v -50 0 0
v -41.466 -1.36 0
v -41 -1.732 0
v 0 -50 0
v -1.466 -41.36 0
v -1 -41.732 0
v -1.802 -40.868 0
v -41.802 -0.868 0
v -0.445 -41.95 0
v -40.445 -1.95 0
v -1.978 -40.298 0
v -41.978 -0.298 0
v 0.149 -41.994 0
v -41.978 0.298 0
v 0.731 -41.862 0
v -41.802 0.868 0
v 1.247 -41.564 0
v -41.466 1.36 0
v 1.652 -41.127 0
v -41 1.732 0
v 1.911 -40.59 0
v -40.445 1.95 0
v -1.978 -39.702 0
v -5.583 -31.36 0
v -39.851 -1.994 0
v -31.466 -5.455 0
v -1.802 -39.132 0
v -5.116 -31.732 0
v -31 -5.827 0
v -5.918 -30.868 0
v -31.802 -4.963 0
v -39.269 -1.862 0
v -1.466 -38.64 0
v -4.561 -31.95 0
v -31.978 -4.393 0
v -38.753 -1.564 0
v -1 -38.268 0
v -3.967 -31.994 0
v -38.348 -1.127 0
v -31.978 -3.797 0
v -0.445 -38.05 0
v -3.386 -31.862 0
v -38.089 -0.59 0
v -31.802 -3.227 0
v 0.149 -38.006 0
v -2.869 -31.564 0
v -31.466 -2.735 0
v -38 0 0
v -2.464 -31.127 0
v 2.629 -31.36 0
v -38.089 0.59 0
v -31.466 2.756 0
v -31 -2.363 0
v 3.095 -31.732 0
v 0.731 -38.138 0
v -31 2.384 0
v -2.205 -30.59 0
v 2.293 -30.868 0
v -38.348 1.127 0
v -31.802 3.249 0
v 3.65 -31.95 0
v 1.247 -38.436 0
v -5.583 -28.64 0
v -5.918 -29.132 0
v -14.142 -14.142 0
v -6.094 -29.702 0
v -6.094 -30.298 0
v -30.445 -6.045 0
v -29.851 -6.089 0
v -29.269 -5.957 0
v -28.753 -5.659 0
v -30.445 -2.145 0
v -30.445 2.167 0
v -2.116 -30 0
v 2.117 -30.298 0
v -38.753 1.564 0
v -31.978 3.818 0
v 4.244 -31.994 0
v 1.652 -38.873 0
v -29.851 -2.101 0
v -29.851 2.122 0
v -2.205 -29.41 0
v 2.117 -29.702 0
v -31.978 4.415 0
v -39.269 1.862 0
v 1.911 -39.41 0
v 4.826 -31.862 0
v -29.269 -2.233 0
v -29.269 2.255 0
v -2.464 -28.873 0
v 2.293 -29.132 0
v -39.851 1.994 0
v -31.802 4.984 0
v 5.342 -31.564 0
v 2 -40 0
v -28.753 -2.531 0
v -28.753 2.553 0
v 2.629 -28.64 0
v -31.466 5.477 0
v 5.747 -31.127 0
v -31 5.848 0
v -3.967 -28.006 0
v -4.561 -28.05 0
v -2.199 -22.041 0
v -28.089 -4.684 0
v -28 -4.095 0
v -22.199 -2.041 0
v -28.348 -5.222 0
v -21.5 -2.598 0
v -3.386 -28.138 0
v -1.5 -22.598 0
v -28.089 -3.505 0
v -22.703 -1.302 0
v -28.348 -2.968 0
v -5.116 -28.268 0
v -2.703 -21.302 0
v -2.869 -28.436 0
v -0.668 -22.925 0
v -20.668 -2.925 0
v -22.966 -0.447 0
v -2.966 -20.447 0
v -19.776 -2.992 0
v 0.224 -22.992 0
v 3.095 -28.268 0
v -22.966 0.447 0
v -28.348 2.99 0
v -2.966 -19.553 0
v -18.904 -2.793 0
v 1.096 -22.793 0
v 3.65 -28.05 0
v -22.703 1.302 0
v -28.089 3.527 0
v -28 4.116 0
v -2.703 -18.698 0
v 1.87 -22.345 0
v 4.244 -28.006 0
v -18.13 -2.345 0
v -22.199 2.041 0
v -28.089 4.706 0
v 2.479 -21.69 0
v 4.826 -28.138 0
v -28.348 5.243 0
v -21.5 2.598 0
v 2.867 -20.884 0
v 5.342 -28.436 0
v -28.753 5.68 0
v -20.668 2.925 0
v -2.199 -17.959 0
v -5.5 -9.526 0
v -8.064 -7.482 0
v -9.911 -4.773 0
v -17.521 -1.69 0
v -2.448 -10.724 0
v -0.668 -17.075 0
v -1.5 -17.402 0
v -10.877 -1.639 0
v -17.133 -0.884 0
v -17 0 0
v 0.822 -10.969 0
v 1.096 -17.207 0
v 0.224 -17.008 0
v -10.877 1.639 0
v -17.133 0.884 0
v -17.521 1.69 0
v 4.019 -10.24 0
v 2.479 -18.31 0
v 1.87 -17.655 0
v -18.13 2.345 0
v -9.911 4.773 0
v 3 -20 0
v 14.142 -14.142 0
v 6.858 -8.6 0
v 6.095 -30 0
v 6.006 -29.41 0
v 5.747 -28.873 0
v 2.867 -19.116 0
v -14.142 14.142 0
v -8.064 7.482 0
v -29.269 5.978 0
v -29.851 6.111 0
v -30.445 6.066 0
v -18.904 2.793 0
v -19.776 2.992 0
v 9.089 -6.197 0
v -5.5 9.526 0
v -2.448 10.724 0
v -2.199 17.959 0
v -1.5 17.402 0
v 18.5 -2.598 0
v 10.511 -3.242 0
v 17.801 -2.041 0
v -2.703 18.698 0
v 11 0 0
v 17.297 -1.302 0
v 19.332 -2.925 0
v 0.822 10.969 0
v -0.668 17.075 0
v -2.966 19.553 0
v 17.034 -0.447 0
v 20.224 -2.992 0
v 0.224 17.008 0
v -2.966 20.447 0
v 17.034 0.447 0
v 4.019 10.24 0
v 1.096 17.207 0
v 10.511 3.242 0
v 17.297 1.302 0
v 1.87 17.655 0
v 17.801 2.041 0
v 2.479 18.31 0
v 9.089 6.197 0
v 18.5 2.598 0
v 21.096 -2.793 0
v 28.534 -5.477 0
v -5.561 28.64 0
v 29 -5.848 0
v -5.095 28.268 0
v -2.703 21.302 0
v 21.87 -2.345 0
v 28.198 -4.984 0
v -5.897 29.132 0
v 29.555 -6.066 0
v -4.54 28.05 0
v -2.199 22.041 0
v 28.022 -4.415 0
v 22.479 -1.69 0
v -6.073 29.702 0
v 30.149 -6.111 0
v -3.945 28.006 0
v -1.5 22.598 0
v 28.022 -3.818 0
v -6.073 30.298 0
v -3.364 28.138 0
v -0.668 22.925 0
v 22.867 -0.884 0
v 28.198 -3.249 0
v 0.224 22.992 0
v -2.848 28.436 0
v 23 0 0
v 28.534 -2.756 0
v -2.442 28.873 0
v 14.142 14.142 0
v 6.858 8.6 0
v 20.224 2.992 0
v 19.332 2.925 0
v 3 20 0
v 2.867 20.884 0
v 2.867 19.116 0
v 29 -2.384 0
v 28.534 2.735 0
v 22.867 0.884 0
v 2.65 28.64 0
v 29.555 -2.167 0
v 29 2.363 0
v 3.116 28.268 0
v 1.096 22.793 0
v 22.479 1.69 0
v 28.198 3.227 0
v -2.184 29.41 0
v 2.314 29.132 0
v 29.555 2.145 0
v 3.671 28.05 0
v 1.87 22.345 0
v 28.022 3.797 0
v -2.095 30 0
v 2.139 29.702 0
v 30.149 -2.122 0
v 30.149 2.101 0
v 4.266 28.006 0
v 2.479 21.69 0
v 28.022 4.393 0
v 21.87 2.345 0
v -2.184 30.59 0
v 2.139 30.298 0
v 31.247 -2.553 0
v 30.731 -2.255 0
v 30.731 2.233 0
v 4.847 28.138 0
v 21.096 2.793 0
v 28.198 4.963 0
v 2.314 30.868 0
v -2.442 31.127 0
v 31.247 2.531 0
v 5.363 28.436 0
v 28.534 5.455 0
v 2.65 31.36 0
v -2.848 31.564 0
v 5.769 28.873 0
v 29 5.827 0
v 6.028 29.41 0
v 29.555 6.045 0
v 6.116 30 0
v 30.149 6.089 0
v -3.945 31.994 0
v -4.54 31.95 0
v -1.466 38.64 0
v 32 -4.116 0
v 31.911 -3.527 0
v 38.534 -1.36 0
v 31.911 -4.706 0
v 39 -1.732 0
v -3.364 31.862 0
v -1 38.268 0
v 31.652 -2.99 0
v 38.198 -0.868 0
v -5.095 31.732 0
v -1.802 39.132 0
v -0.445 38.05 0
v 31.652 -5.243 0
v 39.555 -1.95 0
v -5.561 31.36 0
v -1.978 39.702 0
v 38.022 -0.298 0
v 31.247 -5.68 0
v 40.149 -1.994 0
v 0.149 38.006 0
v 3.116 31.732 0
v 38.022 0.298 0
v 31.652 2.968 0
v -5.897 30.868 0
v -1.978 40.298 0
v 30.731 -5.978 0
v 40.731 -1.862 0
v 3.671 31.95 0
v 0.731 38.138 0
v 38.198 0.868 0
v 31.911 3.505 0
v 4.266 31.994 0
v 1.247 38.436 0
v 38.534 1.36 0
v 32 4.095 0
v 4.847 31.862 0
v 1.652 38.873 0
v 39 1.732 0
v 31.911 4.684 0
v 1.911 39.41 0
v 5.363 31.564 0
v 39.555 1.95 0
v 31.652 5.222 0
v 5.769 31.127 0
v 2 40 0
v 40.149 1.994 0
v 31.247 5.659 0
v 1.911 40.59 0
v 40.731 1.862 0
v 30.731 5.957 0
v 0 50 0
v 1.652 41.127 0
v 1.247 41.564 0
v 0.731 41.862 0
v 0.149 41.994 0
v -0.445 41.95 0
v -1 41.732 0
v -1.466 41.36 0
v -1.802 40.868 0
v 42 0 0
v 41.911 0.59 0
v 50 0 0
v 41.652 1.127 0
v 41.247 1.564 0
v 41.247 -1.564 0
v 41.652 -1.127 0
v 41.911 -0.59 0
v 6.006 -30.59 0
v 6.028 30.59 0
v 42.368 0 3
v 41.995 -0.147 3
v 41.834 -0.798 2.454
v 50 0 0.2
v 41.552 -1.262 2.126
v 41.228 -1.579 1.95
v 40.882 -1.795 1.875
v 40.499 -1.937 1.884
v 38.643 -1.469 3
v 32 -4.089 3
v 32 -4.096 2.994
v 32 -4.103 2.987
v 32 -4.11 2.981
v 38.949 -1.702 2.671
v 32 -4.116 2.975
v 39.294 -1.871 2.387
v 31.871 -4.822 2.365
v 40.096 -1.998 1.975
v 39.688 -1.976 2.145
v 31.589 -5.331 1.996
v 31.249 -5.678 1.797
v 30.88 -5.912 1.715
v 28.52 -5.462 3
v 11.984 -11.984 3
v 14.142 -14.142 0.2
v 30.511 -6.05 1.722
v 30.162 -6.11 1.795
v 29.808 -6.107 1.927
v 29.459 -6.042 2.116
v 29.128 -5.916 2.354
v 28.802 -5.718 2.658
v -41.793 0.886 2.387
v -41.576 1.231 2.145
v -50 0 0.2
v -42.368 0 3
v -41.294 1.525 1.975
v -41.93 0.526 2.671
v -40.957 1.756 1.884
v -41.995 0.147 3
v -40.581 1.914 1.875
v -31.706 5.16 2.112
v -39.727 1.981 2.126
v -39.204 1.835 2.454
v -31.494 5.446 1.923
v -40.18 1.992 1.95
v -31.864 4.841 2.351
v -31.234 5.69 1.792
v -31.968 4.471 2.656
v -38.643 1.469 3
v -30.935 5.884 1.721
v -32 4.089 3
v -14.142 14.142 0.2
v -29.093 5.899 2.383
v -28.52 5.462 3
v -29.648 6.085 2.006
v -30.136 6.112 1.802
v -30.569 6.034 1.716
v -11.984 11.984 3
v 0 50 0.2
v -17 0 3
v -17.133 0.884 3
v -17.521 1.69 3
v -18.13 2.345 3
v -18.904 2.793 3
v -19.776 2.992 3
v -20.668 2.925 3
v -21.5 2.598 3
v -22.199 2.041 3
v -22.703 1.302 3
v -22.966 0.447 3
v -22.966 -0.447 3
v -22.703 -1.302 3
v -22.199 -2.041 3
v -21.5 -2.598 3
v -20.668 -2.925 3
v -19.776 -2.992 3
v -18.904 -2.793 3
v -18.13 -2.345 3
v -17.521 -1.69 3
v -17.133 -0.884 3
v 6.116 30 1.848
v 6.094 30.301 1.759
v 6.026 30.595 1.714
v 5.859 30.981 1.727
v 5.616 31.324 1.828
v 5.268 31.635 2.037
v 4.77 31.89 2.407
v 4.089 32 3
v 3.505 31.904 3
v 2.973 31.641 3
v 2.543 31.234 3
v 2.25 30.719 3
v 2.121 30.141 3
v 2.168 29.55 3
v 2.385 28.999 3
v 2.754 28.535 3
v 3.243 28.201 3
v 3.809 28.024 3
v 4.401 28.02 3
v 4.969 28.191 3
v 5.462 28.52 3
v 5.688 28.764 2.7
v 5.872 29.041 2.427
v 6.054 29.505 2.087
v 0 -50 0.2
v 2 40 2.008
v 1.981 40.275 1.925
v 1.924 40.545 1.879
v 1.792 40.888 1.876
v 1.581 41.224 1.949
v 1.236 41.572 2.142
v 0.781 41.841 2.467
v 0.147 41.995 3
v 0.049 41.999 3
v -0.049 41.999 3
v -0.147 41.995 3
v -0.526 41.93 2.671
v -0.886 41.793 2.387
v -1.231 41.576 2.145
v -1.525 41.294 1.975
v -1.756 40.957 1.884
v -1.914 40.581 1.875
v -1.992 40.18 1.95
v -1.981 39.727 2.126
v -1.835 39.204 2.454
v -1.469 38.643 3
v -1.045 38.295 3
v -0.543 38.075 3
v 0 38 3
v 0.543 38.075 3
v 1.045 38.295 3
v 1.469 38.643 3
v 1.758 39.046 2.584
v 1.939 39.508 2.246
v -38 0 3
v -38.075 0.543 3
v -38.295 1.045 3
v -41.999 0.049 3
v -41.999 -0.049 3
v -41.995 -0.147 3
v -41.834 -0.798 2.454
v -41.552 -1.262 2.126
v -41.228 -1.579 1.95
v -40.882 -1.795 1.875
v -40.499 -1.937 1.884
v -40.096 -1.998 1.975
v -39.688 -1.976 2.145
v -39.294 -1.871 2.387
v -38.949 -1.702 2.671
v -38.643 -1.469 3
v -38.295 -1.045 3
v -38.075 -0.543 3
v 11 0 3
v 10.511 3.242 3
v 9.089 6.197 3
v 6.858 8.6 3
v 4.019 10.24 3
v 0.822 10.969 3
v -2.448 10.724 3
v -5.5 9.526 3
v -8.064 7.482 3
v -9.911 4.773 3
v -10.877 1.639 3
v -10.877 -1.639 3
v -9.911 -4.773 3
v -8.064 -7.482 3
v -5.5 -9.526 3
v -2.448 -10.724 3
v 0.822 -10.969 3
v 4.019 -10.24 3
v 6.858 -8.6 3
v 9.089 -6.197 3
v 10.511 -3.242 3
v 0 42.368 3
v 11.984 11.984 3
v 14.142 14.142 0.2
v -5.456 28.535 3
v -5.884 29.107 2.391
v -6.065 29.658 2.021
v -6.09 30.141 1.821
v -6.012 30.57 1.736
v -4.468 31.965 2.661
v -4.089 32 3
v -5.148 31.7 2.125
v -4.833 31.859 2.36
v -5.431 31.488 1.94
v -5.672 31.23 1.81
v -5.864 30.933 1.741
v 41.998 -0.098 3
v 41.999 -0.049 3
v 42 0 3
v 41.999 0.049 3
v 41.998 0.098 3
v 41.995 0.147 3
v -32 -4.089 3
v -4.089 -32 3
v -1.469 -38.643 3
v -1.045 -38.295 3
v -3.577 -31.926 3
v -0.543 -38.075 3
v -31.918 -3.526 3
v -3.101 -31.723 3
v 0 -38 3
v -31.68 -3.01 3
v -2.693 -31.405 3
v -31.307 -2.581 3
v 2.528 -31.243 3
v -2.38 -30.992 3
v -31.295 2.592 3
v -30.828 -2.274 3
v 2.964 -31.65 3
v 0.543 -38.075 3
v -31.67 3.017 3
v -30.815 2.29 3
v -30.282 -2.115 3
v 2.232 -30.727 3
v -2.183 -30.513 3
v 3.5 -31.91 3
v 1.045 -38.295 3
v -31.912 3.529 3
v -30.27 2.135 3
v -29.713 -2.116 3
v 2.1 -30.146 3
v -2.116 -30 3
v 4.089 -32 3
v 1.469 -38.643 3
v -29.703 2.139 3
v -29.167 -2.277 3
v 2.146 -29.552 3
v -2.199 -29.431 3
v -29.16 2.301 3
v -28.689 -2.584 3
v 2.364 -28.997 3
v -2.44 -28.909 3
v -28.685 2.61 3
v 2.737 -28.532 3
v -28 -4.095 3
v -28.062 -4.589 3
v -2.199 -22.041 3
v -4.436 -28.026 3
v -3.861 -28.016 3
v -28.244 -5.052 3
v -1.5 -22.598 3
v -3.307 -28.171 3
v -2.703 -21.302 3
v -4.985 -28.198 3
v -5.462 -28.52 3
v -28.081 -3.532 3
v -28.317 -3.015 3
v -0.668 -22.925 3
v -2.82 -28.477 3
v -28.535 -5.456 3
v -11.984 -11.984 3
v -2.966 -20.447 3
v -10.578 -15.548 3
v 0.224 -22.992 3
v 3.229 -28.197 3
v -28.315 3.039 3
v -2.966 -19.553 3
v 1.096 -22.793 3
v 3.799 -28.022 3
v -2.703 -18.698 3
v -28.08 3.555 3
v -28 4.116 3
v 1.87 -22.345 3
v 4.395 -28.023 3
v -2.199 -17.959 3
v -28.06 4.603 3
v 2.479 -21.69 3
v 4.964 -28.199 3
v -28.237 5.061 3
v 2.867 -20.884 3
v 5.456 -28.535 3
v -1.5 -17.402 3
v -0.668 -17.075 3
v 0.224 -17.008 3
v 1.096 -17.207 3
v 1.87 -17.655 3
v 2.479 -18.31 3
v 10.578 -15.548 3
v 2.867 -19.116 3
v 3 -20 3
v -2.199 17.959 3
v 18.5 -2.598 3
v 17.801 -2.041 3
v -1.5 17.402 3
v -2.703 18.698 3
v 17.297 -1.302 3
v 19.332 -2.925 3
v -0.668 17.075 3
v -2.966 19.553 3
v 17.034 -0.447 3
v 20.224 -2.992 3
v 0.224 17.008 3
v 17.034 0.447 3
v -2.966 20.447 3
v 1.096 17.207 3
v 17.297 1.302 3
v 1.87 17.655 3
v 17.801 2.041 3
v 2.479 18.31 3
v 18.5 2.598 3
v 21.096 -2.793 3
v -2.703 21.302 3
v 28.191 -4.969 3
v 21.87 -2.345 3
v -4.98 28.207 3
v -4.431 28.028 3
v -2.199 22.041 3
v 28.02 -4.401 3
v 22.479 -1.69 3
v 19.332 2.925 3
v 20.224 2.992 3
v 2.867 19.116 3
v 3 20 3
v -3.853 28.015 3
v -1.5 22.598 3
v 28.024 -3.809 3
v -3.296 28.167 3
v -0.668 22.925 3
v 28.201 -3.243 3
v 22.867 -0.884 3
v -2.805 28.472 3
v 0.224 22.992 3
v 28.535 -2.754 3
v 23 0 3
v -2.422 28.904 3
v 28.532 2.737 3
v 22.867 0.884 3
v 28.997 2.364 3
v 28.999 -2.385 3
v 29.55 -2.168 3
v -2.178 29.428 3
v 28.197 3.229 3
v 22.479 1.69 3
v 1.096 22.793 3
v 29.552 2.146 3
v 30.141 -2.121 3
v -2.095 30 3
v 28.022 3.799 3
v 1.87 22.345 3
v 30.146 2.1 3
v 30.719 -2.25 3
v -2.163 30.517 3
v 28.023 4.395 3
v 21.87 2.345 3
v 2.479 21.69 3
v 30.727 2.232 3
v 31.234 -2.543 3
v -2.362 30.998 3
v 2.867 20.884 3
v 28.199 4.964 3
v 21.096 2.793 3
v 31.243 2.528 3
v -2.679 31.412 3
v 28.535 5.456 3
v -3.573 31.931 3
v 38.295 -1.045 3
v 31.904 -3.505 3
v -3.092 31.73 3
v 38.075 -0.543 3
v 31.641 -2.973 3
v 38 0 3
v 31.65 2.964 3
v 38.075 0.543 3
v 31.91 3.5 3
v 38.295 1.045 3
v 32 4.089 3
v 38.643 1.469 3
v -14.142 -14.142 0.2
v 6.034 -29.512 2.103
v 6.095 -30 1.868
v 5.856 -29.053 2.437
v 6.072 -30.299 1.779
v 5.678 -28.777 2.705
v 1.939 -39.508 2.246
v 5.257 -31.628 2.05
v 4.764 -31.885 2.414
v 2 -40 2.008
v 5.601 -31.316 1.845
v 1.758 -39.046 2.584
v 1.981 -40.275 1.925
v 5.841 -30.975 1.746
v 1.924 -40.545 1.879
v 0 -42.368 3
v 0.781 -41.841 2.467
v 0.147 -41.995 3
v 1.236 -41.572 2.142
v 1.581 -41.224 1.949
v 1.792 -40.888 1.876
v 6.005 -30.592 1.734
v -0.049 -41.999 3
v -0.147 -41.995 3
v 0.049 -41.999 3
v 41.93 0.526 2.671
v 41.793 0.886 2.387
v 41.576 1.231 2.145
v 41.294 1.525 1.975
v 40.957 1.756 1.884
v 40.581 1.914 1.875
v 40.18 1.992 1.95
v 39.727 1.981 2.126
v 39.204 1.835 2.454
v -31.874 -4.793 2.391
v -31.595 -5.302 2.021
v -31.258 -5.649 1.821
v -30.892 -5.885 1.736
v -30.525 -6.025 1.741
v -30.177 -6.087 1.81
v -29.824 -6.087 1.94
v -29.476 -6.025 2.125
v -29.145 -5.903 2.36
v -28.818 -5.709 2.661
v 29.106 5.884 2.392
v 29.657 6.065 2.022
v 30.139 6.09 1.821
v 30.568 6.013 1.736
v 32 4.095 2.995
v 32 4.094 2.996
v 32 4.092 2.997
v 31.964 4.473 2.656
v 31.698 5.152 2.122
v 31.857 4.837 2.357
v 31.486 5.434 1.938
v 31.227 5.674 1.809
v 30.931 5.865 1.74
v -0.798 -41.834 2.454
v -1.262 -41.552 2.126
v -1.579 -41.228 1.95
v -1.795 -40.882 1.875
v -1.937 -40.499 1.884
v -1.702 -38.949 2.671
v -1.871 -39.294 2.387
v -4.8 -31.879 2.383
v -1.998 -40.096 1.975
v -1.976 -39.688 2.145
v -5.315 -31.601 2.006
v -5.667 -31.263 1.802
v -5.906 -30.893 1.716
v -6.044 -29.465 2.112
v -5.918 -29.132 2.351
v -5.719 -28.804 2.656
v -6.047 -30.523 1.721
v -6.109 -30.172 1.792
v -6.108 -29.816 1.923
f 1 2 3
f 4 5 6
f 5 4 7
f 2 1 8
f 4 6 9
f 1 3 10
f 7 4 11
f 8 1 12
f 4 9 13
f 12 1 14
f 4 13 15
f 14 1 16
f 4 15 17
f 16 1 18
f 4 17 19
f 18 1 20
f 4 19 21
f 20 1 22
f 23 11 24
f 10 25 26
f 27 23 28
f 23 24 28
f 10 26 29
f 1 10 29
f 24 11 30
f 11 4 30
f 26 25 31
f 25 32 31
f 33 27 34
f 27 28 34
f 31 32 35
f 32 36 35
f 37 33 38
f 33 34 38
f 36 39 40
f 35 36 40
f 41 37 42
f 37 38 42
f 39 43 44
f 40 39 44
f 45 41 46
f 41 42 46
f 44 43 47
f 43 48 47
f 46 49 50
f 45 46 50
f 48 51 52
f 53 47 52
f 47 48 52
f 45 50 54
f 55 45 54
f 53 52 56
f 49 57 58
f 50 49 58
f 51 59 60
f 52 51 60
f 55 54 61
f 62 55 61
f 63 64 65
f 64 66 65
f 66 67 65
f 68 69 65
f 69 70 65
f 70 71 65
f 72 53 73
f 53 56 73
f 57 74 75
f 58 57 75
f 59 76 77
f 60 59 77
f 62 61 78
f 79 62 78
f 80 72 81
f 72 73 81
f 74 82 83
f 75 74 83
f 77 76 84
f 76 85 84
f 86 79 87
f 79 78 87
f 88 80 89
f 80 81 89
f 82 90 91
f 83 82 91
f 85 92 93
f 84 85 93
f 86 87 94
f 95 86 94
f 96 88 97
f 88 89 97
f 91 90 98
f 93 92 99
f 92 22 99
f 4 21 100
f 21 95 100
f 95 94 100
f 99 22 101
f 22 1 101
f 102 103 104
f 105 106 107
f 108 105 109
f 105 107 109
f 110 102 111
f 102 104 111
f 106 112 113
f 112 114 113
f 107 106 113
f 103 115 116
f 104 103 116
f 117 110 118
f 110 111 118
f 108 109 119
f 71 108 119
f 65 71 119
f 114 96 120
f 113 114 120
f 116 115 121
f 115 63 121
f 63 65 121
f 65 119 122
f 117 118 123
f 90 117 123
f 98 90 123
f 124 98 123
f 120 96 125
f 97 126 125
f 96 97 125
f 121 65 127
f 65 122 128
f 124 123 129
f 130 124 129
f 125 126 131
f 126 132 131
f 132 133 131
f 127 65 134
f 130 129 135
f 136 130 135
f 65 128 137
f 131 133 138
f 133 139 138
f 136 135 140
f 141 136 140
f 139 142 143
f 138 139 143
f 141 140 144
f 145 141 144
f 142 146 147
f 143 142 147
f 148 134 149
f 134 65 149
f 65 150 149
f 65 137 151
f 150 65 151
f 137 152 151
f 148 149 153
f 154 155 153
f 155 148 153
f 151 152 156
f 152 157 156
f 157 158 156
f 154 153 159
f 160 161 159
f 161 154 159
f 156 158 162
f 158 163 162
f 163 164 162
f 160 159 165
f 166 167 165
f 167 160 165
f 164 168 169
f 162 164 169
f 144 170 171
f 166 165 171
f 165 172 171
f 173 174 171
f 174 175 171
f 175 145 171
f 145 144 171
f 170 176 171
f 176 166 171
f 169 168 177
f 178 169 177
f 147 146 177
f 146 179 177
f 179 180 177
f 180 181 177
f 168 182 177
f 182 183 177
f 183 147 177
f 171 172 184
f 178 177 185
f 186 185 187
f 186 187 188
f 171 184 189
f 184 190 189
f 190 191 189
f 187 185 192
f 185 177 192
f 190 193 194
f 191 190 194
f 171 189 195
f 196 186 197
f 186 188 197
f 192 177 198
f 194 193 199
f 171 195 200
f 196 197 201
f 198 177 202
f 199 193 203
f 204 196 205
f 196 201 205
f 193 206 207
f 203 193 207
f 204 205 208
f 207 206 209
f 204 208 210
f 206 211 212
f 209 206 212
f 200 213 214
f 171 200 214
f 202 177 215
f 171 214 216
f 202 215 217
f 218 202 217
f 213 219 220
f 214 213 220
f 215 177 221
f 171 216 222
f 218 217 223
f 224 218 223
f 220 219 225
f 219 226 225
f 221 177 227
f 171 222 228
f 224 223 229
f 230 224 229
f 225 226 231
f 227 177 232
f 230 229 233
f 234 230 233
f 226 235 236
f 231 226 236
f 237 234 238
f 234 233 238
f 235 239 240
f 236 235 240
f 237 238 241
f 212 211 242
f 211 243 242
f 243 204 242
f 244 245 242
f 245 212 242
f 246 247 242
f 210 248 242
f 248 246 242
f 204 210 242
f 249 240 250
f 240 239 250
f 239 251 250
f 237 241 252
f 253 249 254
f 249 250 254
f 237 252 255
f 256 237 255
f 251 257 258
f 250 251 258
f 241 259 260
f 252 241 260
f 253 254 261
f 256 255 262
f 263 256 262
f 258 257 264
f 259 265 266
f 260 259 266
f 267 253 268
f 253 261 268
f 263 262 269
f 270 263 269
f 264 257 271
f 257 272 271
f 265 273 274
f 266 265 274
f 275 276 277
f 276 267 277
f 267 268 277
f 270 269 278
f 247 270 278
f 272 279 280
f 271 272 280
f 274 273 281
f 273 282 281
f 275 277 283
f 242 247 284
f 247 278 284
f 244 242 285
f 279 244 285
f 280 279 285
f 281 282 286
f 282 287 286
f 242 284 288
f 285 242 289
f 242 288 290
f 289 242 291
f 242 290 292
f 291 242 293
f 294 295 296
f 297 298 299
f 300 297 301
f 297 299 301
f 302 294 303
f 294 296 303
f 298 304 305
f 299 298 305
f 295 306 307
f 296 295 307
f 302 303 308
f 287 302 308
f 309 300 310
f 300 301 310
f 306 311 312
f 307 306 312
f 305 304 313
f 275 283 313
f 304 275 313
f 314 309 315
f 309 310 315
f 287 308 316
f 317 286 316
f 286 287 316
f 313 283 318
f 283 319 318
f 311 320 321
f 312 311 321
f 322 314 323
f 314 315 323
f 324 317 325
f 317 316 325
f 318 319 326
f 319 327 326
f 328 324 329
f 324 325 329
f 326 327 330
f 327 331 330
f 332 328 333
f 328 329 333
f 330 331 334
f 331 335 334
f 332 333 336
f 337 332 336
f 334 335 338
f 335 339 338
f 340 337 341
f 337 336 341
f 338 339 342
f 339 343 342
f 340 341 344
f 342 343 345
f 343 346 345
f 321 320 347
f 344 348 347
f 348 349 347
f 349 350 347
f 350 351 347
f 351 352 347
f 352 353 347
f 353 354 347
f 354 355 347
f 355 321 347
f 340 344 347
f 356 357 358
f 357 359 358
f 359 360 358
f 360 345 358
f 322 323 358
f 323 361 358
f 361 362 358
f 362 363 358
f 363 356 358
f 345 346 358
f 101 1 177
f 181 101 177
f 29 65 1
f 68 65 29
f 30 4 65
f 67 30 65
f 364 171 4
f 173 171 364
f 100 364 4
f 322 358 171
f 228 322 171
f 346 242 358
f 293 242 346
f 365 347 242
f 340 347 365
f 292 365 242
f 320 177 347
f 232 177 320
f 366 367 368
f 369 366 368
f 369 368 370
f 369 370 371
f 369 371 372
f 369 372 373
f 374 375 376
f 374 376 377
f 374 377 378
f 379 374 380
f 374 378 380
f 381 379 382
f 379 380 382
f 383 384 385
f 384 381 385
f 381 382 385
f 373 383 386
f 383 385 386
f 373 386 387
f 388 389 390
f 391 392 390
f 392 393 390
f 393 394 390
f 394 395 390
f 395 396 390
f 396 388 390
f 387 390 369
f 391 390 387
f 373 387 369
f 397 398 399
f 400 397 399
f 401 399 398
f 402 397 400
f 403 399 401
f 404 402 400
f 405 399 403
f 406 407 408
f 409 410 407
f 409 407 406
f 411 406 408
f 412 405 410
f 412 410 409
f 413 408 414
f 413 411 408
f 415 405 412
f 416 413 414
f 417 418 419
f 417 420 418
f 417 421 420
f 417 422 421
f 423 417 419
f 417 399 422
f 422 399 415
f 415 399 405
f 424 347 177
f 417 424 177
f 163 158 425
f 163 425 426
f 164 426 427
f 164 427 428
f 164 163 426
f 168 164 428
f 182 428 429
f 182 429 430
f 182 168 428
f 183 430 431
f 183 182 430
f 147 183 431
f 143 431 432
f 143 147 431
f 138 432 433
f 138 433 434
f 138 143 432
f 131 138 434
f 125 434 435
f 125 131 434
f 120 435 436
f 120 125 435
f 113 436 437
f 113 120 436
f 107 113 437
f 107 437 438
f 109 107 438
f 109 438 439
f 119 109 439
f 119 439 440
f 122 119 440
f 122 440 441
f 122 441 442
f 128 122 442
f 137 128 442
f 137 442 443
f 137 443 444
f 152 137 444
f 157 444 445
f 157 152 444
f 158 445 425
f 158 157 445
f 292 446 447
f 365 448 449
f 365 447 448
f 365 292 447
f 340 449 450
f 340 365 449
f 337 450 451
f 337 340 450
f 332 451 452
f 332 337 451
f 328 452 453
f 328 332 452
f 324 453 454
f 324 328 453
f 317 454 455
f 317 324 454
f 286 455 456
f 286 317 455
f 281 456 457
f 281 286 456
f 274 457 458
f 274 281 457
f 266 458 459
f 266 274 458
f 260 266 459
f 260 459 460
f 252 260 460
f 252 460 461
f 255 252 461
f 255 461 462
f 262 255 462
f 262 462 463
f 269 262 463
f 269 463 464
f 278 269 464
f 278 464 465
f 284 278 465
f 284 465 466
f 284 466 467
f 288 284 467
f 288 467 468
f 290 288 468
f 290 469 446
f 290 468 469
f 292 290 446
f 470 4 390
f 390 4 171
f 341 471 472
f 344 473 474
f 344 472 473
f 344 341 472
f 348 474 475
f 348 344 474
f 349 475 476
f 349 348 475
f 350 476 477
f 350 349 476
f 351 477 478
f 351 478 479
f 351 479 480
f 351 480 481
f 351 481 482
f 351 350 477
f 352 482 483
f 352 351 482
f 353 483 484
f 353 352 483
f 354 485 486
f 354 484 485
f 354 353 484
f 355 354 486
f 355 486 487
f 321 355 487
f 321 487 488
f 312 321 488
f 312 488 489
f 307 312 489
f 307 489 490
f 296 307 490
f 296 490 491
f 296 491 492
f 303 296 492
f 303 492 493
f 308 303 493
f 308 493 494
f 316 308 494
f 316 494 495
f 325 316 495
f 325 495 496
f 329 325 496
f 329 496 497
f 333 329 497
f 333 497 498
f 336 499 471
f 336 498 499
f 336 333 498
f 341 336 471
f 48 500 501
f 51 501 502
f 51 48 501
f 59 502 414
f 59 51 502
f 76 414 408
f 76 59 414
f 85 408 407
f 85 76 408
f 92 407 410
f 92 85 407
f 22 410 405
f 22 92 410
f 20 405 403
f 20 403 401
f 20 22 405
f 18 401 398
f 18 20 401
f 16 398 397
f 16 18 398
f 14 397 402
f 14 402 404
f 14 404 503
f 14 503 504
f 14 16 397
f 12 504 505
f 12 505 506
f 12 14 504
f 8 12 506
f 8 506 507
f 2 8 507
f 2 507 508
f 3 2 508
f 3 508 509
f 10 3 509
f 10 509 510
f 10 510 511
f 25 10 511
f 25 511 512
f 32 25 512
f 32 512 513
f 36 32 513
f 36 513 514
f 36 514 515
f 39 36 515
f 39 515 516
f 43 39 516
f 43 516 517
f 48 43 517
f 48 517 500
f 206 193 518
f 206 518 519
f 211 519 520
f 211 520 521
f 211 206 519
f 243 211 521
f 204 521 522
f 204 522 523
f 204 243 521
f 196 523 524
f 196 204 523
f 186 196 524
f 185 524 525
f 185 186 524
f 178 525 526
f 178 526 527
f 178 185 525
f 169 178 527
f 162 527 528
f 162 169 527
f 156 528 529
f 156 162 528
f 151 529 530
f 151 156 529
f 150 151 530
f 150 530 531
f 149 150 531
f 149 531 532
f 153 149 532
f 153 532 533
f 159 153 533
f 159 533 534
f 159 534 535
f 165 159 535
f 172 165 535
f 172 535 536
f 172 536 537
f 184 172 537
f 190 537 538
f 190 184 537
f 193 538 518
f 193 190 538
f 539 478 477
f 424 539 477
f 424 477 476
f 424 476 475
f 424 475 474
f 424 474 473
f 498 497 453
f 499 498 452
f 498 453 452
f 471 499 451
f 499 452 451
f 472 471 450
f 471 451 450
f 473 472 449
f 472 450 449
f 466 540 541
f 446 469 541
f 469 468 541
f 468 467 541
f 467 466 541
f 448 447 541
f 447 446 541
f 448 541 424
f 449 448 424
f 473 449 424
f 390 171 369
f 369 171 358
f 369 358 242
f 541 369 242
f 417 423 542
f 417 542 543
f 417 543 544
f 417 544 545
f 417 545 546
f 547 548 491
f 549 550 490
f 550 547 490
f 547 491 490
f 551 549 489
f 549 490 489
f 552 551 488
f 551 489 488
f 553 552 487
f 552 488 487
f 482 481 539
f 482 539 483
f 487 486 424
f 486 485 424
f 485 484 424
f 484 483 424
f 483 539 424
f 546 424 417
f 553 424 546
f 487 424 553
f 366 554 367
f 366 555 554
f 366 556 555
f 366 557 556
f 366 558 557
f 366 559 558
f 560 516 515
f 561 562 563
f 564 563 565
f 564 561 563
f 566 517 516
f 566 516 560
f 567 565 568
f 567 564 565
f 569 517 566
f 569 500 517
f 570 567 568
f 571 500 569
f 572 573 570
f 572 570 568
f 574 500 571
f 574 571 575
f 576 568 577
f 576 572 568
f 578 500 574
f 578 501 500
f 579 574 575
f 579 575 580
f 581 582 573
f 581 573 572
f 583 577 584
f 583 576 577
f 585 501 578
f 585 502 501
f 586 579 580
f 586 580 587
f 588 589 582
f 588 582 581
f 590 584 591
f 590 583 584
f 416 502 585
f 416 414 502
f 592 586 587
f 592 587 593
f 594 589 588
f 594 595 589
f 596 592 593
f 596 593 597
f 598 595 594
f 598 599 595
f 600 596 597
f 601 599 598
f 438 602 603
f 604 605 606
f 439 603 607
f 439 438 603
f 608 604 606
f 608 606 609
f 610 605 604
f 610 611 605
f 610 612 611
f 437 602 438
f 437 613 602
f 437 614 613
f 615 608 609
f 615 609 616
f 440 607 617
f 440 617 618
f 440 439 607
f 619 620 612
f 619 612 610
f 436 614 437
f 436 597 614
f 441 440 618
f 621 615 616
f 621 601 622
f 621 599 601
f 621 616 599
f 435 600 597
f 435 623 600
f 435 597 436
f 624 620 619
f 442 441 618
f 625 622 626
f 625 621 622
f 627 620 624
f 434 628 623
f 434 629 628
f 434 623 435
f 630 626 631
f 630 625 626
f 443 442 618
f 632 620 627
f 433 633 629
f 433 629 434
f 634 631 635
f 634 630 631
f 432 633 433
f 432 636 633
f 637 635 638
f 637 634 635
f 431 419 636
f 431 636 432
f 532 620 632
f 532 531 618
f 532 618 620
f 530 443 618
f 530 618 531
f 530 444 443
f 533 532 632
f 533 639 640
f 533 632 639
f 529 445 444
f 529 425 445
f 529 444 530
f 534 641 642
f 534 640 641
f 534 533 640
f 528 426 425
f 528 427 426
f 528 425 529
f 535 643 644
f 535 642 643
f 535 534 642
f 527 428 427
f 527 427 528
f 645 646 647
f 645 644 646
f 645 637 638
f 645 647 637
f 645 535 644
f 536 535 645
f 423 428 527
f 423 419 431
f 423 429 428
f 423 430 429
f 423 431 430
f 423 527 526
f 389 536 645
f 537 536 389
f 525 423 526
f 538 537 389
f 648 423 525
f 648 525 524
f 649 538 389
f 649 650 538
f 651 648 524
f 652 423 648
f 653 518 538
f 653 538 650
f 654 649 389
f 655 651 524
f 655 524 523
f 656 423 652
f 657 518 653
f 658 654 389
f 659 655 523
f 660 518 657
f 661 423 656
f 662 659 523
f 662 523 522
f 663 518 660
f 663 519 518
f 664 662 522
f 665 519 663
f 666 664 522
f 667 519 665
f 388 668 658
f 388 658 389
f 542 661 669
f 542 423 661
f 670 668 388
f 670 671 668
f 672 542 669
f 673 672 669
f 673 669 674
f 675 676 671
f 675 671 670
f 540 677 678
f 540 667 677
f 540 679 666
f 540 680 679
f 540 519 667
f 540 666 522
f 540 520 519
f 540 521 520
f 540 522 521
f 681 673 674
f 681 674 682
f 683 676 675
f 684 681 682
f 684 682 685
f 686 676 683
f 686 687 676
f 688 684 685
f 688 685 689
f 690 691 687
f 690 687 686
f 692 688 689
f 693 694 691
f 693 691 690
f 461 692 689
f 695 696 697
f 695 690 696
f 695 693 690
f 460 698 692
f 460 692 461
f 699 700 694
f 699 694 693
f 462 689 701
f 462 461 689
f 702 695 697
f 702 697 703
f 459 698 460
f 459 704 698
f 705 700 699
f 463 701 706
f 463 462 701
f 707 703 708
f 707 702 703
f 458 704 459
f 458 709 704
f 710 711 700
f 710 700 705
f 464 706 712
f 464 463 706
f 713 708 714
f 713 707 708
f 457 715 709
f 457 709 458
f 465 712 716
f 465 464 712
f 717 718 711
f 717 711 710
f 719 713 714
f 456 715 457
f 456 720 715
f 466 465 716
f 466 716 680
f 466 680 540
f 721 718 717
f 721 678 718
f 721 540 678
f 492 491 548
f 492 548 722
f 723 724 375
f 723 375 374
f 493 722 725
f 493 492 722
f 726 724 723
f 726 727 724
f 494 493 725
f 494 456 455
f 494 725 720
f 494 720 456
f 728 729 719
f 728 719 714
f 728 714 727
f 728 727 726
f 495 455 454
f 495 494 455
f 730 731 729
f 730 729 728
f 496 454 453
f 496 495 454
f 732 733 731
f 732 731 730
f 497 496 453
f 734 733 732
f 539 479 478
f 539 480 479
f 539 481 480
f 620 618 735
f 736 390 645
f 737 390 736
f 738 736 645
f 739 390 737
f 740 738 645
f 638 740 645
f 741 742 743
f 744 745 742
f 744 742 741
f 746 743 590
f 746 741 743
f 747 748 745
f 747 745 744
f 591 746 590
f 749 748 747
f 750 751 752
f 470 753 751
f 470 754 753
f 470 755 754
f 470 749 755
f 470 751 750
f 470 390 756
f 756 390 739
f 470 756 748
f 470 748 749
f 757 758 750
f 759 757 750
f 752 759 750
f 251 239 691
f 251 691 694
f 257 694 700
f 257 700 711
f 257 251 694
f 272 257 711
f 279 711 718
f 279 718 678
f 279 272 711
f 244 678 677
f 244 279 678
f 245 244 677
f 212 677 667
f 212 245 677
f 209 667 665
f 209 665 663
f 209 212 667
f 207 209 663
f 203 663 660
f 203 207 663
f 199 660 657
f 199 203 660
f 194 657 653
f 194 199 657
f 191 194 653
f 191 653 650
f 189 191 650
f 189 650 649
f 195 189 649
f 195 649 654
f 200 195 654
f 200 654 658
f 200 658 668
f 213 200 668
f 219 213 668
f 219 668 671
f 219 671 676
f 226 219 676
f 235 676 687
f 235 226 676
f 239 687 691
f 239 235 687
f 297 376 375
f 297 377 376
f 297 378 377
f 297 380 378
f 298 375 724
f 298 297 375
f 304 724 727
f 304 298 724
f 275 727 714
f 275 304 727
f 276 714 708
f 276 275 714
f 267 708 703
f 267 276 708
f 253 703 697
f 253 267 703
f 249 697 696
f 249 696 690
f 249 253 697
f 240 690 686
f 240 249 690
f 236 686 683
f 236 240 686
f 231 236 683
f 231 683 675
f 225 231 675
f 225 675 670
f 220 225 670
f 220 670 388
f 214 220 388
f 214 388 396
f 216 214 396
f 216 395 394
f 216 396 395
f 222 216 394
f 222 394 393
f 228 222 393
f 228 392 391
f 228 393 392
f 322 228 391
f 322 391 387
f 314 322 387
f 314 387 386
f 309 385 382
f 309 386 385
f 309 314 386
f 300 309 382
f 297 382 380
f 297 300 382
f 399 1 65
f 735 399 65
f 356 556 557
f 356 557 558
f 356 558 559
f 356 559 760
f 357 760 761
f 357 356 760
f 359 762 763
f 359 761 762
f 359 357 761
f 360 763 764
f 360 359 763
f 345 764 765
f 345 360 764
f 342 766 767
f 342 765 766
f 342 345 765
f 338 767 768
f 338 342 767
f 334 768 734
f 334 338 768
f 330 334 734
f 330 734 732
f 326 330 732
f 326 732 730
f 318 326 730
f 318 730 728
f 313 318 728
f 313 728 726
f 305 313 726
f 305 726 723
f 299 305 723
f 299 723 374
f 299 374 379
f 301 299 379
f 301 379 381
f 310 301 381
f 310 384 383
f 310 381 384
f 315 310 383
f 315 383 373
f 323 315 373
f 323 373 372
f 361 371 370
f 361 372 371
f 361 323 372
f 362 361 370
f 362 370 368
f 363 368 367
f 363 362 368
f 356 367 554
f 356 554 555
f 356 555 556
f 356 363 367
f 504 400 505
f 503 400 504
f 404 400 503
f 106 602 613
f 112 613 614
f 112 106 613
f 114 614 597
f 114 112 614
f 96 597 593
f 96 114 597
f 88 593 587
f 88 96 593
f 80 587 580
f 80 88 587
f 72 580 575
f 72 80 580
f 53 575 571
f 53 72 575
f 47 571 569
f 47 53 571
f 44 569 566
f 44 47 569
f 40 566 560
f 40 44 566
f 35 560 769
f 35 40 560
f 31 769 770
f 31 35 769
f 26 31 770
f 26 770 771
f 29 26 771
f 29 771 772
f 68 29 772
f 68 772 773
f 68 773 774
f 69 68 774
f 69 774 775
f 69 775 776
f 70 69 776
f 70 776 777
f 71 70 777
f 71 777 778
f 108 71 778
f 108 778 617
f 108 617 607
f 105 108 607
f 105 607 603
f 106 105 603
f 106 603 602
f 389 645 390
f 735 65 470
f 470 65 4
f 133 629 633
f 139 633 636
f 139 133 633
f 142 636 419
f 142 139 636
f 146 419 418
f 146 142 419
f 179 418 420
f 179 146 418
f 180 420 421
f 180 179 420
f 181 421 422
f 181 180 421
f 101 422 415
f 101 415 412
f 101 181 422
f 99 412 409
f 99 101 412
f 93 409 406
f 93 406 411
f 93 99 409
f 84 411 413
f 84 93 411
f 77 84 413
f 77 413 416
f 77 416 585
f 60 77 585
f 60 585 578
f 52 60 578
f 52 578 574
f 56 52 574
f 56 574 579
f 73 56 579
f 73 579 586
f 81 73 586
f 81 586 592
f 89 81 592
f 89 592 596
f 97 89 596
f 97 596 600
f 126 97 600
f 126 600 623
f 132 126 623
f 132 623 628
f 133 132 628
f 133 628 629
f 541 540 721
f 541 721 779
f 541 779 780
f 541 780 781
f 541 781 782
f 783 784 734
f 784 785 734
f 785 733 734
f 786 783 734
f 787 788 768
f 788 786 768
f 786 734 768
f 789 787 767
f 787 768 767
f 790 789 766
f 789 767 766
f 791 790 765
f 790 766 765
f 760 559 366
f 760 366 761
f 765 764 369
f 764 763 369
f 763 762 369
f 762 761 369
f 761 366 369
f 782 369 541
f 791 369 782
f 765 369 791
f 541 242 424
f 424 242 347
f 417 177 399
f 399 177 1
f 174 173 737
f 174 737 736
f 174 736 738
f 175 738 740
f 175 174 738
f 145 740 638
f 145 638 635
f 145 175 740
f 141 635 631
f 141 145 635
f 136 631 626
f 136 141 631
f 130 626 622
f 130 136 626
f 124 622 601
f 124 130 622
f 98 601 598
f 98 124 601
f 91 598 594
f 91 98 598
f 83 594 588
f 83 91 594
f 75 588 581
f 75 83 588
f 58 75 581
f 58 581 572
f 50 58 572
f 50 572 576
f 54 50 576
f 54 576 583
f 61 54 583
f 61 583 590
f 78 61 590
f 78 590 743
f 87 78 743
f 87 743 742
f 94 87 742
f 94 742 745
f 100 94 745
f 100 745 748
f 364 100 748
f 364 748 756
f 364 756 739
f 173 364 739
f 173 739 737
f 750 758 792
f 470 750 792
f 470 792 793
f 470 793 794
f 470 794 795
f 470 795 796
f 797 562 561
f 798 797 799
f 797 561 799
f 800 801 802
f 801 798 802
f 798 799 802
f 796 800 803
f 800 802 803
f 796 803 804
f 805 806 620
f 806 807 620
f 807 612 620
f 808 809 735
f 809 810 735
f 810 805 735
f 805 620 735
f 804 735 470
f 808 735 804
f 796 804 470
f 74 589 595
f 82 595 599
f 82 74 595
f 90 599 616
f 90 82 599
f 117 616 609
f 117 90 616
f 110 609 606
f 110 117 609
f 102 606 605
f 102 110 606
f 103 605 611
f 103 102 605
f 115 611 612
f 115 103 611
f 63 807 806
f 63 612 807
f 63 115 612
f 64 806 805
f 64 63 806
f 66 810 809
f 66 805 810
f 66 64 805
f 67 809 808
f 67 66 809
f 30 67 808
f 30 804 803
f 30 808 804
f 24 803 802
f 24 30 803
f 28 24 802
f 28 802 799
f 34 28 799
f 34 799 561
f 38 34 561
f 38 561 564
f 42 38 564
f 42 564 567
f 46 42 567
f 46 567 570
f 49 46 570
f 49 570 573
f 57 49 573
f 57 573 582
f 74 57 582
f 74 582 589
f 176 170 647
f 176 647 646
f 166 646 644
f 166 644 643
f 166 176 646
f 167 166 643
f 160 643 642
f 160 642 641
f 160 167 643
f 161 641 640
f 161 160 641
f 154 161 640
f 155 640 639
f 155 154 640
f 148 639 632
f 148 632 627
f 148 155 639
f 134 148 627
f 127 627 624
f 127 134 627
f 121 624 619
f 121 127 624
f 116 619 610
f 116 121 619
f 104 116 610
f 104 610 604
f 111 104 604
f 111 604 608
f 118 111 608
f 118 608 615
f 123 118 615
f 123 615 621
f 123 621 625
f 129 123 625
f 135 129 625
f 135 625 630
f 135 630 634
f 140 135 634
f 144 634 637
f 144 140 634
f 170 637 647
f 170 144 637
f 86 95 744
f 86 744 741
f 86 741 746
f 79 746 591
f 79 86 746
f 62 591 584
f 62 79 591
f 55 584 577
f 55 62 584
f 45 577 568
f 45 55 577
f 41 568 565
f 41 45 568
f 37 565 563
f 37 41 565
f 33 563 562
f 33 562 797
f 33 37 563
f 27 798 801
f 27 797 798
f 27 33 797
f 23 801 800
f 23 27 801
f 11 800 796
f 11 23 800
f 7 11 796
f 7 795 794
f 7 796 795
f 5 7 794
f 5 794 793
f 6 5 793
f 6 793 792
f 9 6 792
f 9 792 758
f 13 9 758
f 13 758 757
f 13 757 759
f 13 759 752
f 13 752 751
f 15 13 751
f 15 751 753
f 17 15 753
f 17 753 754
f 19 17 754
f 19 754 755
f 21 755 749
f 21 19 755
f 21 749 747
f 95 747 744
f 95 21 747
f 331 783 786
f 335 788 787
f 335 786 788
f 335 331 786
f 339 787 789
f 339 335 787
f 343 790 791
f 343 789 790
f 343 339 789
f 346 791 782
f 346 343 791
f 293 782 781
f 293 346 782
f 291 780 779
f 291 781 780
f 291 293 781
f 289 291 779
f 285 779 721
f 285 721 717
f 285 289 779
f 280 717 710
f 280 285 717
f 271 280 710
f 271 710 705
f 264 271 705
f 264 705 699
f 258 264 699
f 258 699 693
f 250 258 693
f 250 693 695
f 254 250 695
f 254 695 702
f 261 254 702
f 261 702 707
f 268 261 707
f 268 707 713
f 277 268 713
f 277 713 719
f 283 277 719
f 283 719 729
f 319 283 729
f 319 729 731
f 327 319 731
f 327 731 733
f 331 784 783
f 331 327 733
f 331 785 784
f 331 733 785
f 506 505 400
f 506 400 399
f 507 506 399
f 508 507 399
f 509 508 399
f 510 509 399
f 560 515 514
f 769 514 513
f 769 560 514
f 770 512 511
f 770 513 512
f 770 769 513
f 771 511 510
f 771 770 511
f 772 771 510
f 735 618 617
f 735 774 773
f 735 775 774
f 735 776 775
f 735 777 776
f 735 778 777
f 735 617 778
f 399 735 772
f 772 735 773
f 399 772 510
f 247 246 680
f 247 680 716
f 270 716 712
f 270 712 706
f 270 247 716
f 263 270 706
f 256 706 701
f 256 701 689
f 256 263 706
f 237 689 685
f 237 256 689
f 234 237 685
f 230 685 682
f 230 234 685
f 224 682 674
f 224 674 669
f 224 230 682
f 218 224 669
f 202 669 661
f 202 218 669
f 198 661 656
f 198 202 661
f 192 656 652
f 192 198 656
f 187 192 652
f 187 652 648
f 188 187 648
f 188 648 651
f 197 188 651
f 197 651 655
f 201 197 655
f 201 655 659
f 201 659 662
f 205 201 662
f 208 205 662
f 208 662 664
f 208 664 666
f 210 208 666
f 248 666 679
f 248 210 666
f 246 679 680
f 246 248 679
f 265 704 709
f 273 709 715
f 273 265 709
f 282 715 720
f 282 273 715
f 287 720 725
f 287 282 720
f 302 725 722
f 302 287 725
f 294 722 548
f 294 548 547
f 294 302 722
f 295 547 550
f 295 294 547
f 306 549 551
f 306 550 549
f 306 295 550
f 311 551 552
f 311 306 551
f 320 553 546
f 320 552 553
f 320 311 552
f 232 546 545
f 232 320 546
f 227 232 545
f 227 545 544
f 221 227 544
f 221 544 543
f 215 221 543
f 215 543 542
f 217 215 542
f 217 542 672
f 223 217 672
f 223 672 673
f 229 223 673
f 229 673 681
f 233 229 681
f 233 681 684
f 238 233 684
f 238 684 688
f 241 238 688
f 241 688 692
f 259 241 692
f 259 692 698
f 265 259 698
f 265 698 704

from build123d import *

# Parameters (mm, degrees)
F0_R         = 2
F0_R_2       = 3
F0_R_3       = 11
F1_DEPTH     = 3
F2_T4_DEPTH  = 52.9473251324
F3_T4_DEPTH  = 48.8454257103
F4_T4_DEPTH  = 56.77883553
F4_T10_DEPTH = 56.77883553
F4_T15_DEPTH = 52.9473251324
F4_T20_DEPTH = 52.9473251324
F4_T25_DEPTH = 56.77883553
F4_T31_DEPTH = 56.77883553
F4_T36_DEPTH = 52.9473251324
F4_T41_DEPTH = 52.9473251324
F4_T47_DEPTH = 52.9473251324
F4_T51_DEPTH = 52.9473251324
F4_T58_DEPTH = 52.9473251324
F4_T62_DEPTH = 52.9473251324


# Not quite as in the source:
# - a fillet or chamfer that OpenCascade refuses, or shapes differently, is made with other operations: its cross-section is extruded or revolved along the edge and cut away or added


with BuildPart() as f1:
    # F0 (on Top) → F1 (new body)
    with BuildSketch(Plane.XY):
        Polygon((-14.1421356237, 14.1421356237), (-50, 0), (-14.1421356237, -14.1421356237), (0, -50), (14.1421356237, -14.1421356237), (50, 0), (14.1421356237, 14.1421356237), (0, 50), align=None)
        with Locations((-4.1164257564, -30)):
            Circle(F0_R, mode=Mode.SUBTRACT)
        with Locations((-30, -4.0949434042)):
            Circle(F0_R, mode=Mode.SUBTRACT)
        with Locations((0, -40)):
            Circle(F0_R, mode=Mode.SUBTRACT)
        with Locations((4.0949434042, -30)):
            Circle(F0_R, mode=Mode.SUBTRACT)
        with Locations((0, -20)):
            Circle(F0_R_2, mode=Mode.SUBTRACT)
        with Locations((30, -4.1164257564)):
            Circle(F0_R, mode=Mode.SUBTRACT)
        with Locations((-40, 0)):
            Circle(F0_R, mode=Mode.SUBTRACT)
        with Locations((-30, 4.1164257564)):
            Circle(F0_R, mode=Mode.SUBTRACT)
        with Locations((-20, 0)):
            Circle(F0_R_2, mode=Mode.SUBTRACT)
        with Locations((-4.0949434042, 30)):
            Circle(F0_R, mode=Mode.SUBTRACT)
        Circle(F0_R_3, mode=Mode.SUBTRACT)
        with Locations((20, 0)):
            Circle(F0_R_2, mode=Mode.SUBTRACT)
        with Locations((0, 20)):
            Circle(F0_R_2, mode=Mode.SUBTRACT)
        with Locations((30, 4.0949434042)):
            Circle(F0_R, mode=Mode.SUBTRACT)
        with Locations((40, 0)):
            Circle(F0_R, mode=Mode.SUBTRACT)
        with Locations((4.1164257564, 30)):
            Circle(F0_R, mode=Mode.SUBTRACT)
        with Locations((0, 40)):
            Circle(F0_R, mode=Mode.SUBTRACT)
    extrude(amount=F1_DEPTH)

    # F2: chamfer of 2.8 on 1 edges, made by hand


with BuildPart() as f2_tool2:
    # F2_s3 → F2_t4 (new body)
    with BuildSketch(Plane(origin=(-19.7071398503, -49.9681212794, 0), x_dir=(0, 0, 1), z_dir=(0.3668907842, 0.930264023, 0))):
        Polygon((0.2, 18.3445392079), (3, 15.5445392079), (3, 18.3445392079), align=None)
    extrude(amount=F2_T4_DEPTH)

    split(bisect_by=Plane(origin=(6.730442375, -17.0652648437, 0), x_dir=(0, 0, 1), z_dir=(0.3668907842, -0.930264023, 0)), keep=Keep.TOP)


with BuildPart() as f1_1:
    add(f1.part)

    # F2_t1: cut F2_tool2
    add(f2_tool2.part, mode=Mode.SUBTRACT)

    # F3: chamfer of 2.8 on 1 edges, made by hand


with BuildPart() as f3_tool2:
    # F3_s3 → F3_t4 (new body)
    with BuildSketch(Plane(origin=(0.2812542134, -0.7131295943, 0), x_dir=(0, 0, 1), z_dir=(0.3668907842, -0.930264023, 0))):
        Polygon((3, 15.5445392079), (0.2, 18.3445392079), (3, 18.3445392079), align=None)
    extrude(amount=F3_T4_DEPTH)

    split(bisect_by=Plane(origin=(-6.730442375, -17.0652648437, 0), x_dir=(0, 0, 1), z_dir=(-0.3668907842, -0.930264023, 0)), keep=Keep.TOP)


with BuildPart() as f1_2:
    add(f1_1.part)

    # F3_t1: cut F3_tool2
    add(f3_tool2.part, mode=Mode.SUBTRACT)

    # F4: chamfer of 2.8 on 6 edges, made by hand


with BuildPart() as f4_tool2:
    # F4_s3 → F4_t4 (new body)
    with BuildSketch(Plane(origin=(-2.8511866823, -1.1244916409, 0), x_dir=(0, 0, 1), z_dir=(0.930264023, 0.3668907842, 0))):
        Polygon((3, 15.5445392079), (0.2, 18.3445392079), (3, 18.3445392079), align=None)
    extrude(amount=F4_T4_DEPTH)

    split(bisect_by=Plane(origin=(17.0652648437, -6.730442375, 0), x_dir=(0, 0, 1), z_dir=(-0.930264023, 0.3668907842, 0)), keep=Keep.TOP)

    split(bisect_by=Plane(origin=(8.6256588242, -3.4019102659, 9.272269604), x_dir=(0.3668907842, 0.930264023, 0), z_dir=(0.657795999, -0.2594309614, 0.7071067812)), keep=Keep.TOP)


with BuildPart() as f1_3:
    add(f1_2.part)

    # F4_t1: cut F4_tool2
    add(f4_tool2.part, mode=Mode.SUBTRACT)


with BuildPart() as f4_tool8:
    # F4_s9 → F4_t10 (new body)
    with BuildSketch(Plane(origin=(-2.8511866823, -1.1244916409, 0), x_dir=(0, 0, 1), z_dir=(0.930264023, 0.3668907842, 0))):
        Polygon((3, 15.5445392079), (0.2, 18.3445392079), (3, 18.3445392079), align=None)
    extrude(amount=F4_T10_DEPTH)

    split(bisect_by=Plane(origin=(17.0652648437, -6.730442375, 0), x_dir=(0, 0, 1), z_dir=(0.930264023, -0.3668907842, 0)), keep=Keep.TOP)


with BuildPart() as f1_4:
    add(f1_3.part)

    # F4_t7: cut F4_tool8
    add(f4_tool8.part, mode=Mode.SUBTRACT)


with BuildPart() as f4_tool13:
    # F4_s14 → F4_t15 (new body)
    with BuildSketch(Plane(origin=(49.9681212794, -19.7071398503, 0), x_dir=(0, 0, 1), z_dir=(-0.930264023, 0.3668907842, 0))):
        Polygon((3, 15.5445392079), (0.2, 18.3445392079), (3, 18.3445392079), align=None)
    extrude(amount=F4_T15_DEPTH)

    split(bisect_by=Plane(origin=(17.0652648437, 6.730442375, 0), x_dir=(0, 0, 1), z_dir=(0.930264023, 0.3668907842, 0)), keep=Keep.TOP)


with BuildPart() as f1_5:
    add(f1_4.part)

    # F4_t12: cut F4_tool13
    add(f4_tool13.part, mode=Mode.SUBTRACT)


with BuildPart() as f4_tool18:
    # F4_s19 → F4_t20 (new body)
    with BuildSketch(Plane(origin=(-0.2812542134, 0.7131295943, 0), x_dir=(0, 0, 1), z_dir=(-0.3668907842, 0.930264023, 0))):
        Polygon((3, 15.5445392079), (0.2, 18.3445392079), (3, 18.3445392079), align=None)
    extrude(amount=F4_T20_DEPTH)

    split(bisect_by=Plane(origin=(6.730442375, 17.0652648437, 0), x_dir=(0, 0, 1), z_dir=(0.3668907842, 0.930264023, 0)), keep=Keep.TOP)


with BuildPart() as f1_6:
    add(f1_5.part)

    # F4_t17: cut F4_tool18
    add(f4_tool18.part, mode=Mode.SUBTRACT)


with BuildPart() as f4_tool23:
    # F4_s24 → F4_t25 (new body)
    with BuildSketch(Plane(origin=(2.8511866823, -1.1244916409, 0), x_dir=(0, 0, 1), z_dir=(-0.930264023, 0.3668907842, 0))):
        Polygon((3, -15.5445392079), (0.2, -18.3445392079), (3, -18.3445392079), align=None)
    extrude(amount=F4_T25_DEPTH)

    split(bisect_by=Plane(origin=(-17.0652648437, -6.730442375, 0), x_dir=(0, 0, 1), z_dir=(0.930264023, 0.3668907842, 0)), keep=Keep.TOP)

    split(bisect_by=Plane(origin=(-8.6256588242, -3.4019102659, 9.272269604), x_dir=(0.3668907842, -0.930264023, 0), z_dir=(-0.657795999, -0.2594309614, 0.7071067812)), keep=Keep.TOP)


with BuildPart() as f1_7:
    add(f1_6.part)

    # F4_t22: cut F4_tool23
    add(f4_tool23.part, mode=Mode.SUBTRACT)


with BuildPart() as f4_tool29:
    # F4_s30 → F4_t31 (new body)
    with BuildSketch(Plane(origin=(2.8511866823, -1.1244916409, 0), x_dir=(0, 0, 1), z_dir=(-0.930264023, 0.3668907842, 0))):
        Polygon((3, -15.5445392079), (0.2, -18.3445392079), (3, -18.3445392079), align=None)
    extrude(amount=F4_T31_DEPTH)

    split(bisect_by=Plane(origin=(-17.0652648437, -6.730442375, 0), x_dir=(0, 0, 1), z_dir=(-0.930264023, -0.3668907842, 0)), keep=Keep.TOP)


with BuildPart() as f1_8:
    add(f1_7.part)

    # F4_t28: cut F4_tool29
    add(f4_tool29.part, mode=Mode.SUBTRACT)


with BuildPart() as f4_tool34:
    # F4_s35 → F4_t36 (new body)
    with BuildSketch(Plane(origin=(-0.7131295943, -0.2812542134, 0), x_dir=(0, 0, 1), z_dir=(-0.930264023, -0.3668907842, 0))):
        Polygon((0.2, 18.3445392079), (3, 15.5445392079), (3, 18.3445392079), align=None)
    extrude(amount=F4_T36_DEPTH)

    split(bisect_by=Plane(origin=(-17.0652648437, 6.730442375, 0), x_dir=(0, 0, 1), z_dir=(-0.930264023, 0.3668907842, 0)), keep=Keep.TOP)


with BuildPart() as f1_9:
    add(f1_8.part)

    # F4_t33: cut F4_tool34
    add(f4_tool34.part, mode=Mode.SUBTRACT)


with BuildPart() as f4_tool39:
    # F4_s40 → F4_t41 (new body)
    with BuildSketch(Plane(origin=(19.7071398503, 49.9681212794, 0), x_dir=(0, 0, 1), z_dir=(-0.3668907842, -0.930264023, 0))):
        Polygon((3, 15.5445392079), (0.2, 18.3445392079), (3, 18.3445392079), align=None)
    extrude(amount=F4_T41_DEPTH)

    split(bisect_by=Plane(origin=(-6.730442375, 17.0652648437, 0), x_dir=(0, 0, 1), z_dir=(-0.3668907842, 0.930264023, 0)), keep=Keep.TOP)


with BuildPart() as f1_10:
    add(f1_9.part)

    # F4_t38: cut F4_tool39
    add(f4_tool39.part, mode=Mode.SUBTRACT)


with BuildPart() as f4_tool45:
    # F4_s46 → F4_t47 (new body)
    with BuildSketch(Plane(origin=(-0.2812542134, 0.7131295943, 0), x_dir=(0, 0, 1), z_dir=(-0.3668907842, 0.930264023, 0))):
        Polygon((3, 15.5445392079), (0.2, 18.3445392079), (3, 18.3445392079), align=None)
    extrude(amount=F4_T47_DEPTH)

    split(bisect_by=Plane(origin=(6.730442375, 17.0652648437, 0), x_dir=(0, 0, 1), z_dir=(-0.3668907842, -0.930264023, 0)), keep=Keep.TOP)


with BuildPart() as f4_tool49:
    # F4_s50 → F4_t51 (new body)
    with BuildSketch(Plane(origin=(49.9681212794, -19.7071398503, 0), x_dir=(0, 0, 1), z_dir=(-0.930264023, 0.3668907842, 0))):
        Polygon((3, 15.5445392079), (0.2, 18.3445392079), (3, 18.3445392079), align=None)
    extrude(amount=F4_T51_DEPTH)

    split(bisect_by=Plane(origin=(17.0652648437, 6.730442375, 0), x_dir=(0, 0, 1), z_dir=(-0.930264023, -0.3668907842, 0)), keep=Keep.TOP)


with BuildPart() as f4_tool45_1:
    add(f4_tool45.part)

    # F4_t53: intersect F4_tool49
    add(f4_tool49.part, mode=Mode.INTERSECT)


with BuildPart() as f1_11:
    add(f1_10.part)

    # F4_t43: cut F4_tool45
    add(f4_tool45_1.part, mode=Mode.SUBTRACT)


with BuildPart() as f4_tool56:
    # F4_s57 → F4_t58 (new body)
    with BuildSketch(Plane(origin=(-0.7131295943, -0.2812542134, 0), x_dir=(0, 0, 1), z_dir=(-0.930264023, -0.3668907842, 0))):
        Polygon((0.2, 18.3445392079), (3, 15.5445392079), (3, 18.3445392079), align=None)
    extrude(amount=F4_T58_DEPTH)

    split(bisect_by=Plane(origin=(-17.0652648437, 6.730442375, 0), x_dir=(0, 0, 1), z_dir=(0.930264023, -0.3668907842, 0)), keep=Keep.TOP)


with BuildPart() as f4_tool60:
    # F4_s61 → F4_t62 (new body)
    with BuildSketch(Plane(origin=(19.7071398503, 49.9681212794, 0), x_dir=(0, 0, 1), z_dir=(-0.3668907842, -0.930264023, 0))):
        Polygon((3, 15.5445392079), (0.2, 18.3445392079), (3, 18.3445392079), align=None)
    extrude(amount=F4_T62_DEPTH)

    split(bisect_by=Plane(origin=(-6.730442375, 17.0652648437, 0), x_dir=(0, 0, 1), z_dir=(0.3668907842, -0.930264023, 0)), keep=Keep.TOP)


with BuildPart() as f4_tool56_1:
    add(f4_tool56.part)

    # F4_t64: intersect F4_tool60
    add(f4_tool60.part, mode=Mode.INTERSECT)


with BuildPart() as f1_12:
    add(f1_11.part)

    # F4_t54: cut F4_tool56
    add(f4_tool56_1.part, mode=Mode.SUBTRACT)


solid = f1_12.part
